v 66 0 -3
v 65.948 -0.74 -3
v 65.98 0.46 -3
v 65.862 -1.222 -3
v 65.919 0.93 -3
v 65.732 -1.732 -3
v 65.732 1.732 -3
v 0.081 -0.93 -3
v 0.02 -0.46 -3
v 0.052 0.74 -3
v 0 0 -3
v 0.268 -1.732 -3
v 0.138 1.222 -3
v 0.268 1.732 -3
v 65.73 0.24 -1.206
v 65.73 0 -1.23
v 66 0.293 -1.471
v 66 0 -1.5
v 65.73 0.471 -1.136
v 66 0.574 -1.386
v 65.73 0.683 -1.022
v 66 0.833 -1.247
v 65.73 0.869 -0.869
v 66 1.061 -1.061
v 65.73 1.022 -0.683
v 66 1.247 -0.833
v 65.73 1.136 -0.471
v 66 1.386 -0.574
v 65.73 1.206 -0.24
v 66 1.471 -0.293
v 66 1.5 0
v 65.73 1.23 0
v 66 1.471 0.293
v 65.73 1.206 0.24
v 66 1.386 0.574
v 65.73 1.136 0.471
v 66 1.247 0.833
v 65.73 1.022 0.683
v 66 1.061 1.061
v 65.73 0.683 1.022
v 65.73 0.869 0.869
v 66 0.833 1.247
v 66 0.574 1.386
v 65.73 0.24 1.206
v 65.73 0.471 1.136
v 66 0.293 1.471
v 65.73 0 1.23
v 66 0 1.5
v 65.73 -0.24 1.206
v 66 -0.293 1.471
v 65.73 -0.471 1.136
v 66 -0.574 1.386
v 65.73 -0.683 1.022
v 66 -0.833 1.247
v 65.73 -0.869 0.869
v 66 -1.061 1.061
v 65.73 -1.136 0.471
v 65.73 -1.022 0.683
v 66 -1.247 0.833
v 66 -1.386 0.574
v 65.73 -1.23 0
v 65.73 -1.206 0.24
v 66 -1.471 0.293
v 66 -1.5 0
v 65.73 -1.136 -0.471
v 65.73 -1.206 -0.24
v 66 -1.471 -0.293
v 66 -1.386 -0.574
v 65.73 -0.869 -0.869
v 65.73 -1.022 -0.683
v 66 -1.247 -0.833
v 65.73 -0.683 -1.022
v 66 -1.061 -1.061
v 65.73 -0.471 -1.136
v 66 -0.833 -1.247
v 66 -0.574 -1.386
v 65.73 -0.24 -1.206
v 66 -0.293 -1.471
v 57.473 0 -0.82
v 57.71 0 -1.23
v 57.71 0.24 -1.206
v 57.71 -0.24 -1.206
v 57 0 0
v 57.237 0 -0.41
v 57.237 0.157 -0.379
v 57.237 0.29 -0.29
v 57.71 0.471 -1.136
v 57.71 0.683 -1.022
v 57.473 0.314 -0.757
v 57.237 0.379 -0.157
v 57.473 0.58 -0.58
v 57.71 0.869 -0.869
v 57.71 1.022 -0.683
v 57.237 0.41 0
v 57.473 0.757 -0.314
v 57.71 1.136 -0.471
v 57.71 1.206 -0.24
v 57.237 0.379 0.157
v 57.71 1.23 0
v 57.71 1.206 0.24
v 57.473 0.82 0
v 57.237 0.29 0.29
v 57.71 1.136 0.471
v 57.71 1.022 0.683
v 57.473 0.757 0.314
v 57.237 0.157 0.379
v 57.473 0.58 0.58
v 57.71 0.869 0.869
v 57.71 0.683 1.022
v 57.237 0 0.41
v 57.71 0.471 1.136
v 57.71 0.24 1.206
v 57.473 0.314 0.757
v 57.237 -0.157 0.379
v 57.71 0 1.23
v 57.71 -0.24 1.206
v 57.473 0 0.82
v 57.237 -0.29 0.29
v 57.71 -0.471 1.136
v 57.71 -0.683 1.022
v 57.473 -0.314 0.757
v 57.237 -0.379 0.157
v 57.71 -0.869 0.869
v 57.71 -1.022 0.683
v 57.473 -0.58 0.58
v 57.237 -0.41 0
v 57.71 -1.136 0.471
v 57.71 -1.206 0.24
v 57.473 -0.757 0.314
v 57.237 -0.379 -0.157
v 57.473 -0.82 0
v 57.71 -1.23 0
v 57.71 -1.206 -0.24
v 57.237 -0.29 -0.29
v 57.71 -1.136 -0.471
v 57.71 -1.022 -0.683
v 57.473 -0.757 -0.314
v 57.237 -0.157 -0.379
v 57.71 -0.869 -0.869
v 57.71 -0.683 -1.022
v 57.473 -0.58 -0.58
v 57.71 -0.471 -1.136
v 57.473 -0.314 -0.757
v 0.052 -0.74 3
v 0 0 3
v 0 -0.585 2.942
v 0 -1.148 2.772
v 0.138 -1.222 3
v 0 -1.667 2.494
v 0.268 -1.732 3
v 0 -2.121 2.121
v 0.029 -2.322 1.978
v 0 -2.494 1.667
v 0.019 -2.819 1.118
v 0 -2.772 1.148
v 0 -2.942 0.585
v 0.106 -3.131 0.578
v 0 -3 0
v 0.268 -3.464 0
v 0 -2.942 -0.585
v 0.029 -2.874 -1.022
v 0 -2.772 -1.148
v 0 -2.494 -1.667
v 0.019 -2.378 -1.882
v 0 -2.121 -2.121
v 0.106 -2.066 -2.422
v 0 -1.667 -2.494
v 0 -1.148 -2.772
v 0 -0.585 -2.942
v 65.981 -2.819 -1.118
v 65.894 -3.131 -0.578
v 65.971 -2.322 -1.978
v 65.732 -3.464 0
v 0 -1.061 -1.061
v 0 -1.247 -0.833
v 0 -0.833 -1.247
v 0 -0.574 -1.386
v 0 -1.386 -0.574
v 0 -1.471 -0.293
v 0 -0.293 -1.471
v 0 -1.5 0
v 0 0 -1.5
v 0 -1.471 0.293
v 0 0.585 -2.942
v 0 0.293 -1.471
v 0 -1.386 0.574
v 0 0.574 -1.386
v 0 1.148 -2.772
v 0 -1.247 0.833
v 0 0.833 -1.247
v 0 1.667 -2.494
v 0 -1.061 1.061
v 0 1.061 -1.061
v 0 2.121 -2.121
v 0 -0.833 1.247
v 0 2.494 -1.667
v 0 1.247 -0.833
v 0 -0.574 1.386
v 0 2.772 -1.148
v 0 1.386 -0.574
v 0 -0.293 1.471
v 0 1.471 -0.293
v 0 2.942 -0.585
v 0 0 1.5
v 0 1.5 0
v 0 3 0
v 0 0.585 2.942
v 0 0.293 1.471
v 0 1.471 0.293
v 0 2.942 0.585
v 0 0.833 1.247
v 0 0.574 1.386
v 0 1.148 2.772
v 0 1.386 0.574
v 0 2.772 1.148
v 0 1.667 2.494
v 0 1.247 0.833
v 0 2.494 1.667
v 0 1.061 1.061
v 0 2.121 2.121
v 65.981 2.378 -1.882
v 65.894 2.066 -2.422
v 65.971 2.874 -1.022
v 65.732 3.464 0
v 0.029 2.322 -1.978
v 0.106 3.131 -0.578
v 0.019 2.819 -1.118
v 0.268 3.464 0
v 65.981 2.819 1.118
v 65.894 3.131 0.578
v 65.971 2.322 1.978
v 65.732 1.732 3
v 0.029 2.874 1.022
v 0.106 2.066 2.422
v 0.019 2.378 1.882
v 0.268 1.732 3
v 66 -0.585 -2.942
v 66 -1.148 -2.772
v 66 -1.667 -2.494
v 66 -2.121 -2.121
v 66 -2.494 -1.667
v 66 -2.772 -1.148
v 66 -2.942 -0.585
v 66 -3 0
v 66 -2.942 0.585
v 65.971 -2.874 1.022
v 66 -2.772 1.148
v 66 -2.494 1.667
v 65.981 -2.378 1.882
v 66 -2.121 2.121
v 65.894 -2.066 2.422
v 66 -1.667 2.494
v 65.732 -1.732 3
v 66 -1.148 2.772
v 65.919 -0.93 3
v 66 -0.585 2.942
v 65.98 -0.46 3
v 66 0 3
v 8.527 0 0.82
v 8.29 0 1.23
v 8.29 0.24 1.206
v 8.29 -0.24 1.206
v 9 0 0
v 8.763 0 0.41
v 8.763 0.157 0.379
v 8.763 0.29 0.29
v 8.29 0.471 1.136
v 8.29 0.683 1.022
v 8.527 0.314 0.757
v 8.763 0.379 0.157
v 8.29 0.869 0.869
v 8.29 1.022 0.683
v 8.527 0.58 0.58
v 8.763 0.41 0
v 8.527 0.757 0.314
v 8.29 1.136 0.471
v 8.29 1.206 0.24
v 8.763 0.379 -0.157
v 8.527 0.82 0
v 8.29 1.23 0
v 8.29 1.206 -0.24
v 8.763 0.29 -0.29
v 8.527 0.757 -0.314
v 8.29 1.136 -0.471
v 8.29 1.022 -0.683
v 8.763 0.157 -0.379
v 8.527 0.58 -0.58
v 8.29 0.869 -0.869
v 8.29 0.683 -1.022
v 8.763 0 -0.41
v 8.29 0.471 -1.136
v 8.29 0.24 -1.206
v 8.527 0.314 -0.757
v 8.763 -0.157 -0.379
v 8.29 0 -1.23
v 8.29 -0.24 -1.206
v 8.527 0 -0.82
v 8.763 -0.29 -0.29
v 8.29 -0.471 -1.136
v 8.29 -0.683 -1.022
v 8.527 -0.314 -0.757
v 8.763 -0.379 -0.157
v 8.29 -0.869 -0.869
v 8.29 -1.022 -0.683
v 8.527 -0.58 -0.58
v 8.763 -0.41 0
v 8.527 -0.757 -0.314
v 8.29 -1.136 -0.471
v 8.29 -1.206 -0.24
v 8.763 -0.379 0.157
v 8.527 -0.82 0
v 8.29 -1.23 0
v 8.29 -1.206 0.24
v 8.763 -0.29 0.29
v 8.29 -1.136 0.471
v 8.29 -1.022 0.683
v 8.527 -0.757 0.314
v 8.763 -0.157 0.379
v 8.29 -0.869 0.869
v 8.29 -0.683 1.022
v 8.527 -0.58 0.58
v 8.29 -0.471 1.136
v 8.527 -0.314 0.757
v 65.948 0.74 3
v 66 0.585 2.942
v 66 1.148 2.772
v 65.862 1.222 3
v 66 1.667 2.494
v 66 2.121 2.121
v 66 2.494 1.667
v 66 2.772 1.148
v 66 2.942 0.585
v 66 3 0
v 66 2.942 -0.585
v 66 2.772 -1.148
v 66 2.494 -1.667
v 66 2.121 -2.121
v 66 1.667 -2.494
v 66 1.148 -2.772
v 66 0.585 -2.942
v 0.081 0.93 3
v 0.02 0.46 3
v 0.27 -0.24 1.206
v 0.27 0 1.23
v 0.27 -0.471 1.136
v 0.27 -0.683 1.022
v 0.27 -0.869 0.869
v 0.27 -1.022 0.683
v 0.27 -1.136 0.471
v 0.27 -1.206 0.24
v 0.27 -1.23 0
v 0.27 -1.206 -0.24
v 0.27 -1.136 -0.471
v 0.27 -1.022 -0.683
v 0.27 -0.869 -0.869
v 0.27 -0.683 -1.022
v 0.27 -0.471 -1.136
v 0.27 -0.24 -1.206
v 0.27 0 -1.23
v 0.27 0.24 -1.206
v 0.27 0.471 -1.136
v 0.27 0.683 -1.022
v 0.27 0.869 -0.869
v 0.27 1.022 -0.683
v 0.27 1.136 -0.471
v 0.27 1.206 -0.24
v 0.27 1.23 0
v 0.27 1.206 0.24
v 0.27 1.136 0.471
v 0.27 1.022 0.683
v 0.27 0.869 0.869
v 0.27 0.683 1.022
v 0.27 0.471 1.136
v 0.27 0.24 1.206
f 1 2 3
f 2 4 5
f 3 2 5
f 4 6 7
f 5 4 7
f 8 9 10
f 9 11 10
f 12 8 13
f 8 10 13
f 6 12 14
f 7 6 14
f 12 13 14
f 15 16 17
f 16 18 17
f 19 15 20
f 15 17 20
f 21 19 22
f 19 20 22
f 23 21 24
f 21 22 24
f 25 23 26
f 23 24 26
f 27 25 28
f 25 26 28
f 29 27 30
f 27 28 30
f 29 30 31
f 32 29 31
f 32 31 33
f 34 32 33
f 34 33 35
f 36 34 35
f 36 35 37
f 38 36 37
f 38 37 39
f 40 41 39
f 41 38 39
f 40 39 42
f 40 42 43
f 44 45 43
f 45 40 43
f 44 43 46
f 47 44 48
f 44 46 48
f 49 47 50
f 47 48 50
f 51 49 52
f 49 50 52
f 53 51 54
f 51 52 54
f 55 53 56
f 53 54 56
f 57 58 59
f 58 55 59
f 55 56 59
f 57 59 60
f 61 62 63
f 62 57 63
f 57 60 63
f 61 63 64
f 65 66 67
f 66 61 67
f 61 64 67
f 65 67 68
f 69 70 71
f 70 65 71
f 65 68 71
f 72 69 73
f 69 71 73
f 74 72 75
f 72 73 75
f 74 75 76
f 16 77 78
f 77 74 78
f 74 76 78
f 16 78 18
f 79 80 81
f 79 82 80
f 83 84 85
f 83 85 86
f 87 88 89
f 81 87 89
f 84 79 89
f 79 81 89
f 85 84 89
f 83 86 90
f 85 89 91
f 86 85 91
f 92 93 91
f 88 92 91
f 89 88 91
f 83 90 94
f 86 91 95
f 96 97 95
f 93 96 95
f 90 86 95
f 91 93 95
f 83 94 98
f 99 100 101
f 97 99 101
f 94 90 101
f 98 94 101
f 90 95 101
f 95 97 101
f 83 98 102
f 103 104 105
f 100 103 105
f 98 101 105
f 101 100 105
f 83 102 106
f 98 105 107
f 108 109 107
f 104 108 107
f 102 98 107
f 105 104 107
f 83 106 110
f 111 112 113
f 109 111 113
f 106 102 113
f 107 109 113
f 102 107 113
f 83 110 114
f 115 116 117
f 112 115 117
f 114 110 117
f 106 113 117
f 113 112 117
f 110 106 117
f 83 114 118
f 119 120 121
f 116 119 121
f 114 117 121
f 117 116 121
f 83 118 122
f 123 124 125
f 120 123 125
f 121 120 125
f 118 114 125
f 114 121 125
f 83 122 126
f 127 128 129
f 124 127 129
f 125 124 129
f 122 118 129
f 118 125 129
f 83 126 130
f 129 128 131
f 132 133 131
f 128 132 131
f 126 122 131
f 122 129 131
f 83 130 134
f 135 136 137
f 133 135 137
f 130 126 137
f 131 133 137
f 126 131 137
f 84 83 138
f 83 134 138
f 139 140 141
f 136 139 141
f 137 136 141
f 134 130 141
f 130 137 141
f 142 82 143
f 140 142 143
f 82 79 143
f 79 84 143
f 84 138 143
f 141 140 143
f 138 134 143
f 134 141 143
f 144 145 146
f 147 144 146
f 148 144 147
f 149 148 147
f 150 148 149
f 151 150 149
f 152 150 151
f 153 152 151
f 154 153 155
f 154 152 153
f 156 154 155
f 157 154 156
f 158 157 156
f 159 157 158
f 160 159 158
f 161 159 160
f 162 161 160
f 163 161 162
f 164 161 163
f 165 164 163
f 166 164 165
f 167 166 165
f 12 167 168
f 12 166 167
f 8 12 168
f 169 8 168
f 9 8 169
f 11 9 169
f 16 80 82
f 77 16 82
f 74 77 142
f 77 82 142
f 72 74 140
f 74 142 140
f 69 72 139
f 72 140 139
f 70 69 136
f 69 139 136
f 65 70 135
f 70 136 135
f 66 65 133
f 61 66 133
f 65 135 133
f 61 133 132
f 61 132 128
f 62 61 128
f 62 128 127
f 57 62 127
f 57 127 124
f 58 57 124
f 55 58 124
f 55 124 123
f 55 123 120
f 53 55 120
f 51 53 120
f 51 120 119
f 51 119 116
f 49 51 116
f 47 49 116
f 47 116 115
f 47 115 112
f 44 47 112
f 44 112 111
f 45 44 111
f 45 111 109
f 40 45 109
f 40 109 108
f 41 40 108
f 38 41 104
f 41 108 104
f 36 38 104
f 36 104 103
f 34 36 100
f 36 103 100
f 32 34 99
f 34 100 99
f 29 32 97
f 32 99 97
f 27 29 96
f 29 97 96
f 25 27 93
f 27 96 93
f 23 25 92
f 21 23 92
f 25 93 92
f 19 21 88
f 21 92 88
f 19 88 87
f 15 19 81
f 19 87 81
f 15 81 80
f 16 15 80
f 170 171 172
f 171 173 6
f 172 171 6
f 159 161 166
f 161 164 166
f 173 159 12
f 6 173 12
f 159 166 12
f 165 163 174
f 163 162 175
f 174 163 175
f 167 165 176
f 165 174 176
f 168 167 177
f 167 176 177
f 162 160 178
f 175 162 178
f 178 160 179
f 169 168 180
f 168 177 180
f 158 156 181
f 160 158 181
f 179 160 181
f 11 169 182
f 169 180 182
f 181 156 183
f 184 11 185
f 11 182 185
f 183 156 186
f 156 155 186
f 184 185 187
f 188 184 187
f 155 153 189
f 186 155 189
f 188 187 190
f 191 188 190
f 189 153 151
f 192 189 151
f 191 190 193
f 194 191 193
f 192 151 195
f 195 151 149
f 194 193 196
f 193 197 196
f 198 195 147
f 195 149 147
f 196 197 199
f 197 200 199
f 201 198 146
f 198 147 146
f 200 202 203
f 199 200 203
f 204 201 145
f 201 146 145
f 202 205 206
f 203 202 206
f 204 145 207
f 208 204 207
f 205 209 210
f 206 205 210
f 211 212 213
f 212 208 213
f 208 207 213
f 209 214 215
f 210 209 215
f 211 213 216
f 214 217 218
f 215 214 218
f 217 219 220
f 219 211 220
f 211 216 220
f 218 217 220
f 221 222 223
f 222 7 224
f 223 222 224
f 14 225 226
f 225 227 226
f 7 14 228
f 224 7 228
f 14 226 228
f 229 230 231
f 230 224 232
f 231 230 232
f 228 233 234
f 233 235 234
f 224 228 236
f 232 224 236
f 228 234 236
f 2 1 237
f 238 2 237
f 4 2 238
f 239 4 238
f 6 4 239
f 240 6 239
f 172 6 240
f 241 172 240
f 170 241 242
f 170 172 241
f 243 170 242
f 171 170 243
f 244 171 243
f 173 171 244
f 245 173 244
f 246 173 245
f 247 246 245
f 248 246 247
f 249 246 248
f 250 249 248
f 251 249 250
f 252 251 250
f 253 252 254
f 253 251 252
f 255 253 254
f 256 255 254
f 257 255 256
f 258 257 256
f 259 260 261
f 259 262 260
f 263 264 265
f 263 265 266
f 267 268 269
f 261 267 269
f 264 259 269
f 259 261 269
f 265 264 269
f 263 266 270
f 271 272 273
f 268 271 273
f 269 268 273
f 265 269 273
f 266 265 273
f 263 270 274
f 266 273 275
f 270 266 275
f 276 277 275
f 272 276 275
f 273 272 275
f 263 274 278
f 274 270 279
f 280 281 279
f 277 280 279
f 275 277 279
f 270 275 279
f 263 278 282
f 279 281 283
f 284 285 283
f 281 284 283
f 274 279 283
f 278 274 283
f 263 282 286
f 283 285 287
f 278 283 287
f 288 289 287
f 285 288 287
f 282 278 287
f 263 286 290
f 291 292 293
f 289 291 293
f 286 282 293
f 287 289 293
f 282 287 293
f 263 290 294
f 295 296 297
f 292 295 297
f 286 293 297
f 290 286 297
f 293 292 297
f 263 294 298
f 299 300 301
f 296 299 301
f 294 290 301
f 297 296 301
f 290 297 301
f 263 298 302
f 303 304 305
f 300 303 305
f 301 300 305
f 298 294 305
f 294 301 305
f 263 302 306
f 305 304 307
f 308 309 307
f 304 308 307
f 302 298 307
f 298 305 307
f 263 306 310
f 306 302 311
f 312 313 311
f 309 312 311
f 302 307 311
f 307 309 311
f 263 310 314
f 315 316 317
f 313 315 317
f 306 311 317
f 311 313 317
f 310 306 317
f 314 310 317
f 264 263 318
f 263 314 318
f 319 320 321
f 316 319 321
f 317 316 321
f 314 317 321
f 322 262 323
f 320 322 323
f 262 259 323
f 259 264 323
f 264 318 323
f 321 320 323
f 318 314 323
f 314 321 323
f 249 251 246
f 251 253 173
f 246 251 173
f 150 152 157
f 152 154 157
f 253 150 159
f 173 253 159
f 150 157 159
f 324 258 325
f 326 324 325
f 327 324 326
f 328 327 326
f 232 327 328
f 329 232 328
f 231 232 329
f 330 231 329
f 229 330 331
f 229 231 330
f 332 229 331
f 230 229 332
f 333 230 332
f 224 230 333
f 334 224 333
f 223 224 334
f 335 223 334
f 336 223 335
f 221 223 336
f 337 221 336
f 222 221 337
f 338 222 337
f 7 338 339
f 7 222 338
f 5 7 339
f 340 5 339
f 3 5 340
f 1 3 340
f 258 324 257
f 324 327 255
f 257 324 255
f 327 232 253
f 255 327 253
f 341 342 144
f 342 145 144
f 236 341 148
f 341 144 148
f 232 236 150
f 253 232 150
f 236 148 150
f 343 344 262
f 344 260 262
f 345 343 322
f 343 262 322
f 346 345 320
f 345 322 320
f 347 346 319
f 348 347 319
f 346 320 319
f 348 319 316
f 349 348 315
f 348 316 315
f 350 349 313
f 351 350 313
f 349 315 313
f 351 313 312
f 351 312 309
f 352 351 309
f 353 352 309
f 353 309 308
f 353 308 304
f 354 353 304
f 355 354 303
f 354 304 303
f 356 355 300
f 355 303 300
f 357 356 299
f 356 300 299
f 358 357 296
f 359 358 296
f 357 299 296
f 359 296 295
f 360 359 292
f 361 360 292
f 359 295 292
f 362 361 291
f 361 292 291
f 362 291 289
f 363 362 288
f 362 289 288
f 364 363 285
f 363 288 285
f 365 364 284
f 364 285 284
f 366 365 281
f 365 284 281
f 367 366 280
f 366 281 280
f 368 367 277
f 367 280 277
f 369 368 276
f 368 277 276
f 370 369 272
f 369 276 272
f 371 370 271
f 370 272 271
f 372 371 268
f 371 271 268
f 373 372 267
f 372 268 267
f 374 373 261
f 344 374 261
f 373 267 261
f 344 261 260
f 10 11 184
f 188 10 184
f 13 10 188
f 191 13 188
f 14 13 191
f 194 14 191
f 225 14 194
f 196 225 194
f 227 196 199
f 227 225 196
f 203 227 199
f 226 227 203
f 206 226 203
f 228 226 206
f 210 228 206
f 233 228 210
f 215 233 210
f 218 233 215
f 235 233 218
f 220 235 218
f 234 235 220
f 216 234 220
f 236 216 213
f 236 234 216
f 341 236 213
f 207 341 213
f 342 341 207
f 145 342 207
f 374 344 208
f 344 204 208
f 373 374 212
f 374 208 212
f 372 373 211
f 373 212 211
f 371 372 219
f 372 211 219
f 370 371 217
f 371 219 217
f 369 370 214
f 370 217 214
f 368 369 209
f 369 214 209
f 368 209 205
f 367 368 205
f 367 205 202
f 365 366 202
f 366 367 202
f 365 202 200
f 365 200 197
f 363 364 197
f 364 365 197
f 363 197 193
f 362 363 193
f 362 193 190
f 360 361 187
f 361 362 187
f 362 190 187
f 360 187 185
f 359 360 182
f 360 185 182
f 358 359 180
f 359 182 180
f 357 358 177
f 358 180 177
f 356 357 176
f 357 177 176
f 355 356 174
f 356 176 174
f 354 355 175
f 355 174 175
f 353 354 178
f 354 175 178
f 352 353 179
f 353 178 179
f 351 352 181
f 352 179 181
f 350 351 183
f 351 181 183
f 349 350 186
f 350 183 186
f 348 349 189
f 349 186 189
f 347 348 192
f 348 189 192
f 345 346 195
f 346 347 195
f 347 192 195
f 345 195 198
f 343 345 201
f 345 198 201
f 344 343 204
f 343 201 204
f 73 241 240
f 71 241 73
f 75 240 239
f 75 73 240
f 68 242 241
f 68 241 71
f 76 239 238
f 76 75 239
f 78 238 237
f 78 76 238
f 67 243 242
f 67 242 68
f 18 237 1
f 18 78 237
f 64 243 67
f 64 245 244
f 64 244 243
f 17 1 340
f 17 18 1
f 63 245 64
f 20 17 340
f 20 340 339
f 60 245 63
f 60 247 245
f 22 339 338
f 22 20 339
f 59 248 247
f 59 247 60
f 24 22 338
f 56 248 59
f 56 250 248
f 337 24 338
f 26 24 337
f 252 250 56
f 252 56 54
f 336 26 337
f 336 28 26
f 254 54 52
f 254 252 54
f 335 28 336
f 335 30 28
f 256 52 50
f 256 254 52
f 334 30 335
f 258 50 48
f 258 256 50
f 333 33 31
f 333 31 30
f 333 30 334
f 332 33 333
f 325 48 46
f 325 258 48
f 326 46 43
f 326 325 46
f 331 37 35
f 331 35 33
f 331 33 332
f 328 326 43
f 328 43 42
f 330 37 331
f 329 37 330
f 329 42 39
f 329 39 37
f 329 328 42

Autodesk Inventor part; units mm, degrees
sketch "Sketch_1" plane through (0, 0, 0) normal (0, 0, 1) x (1, 0, 0)
  line L0 (66, 0) -> (0, 0)
  line L1 (0, 0) -> (0, 3)
  line L2 (0, 3) -> (2.2517, 6.9)
  line L3 (2.2517, 6.9) -> (63.7483, 6.9)
  line L4 (63.7483, 6.9) -> (66, 3)
  line L5 (66, 3) -> (66, 0)
  line L6 (66, 0) -> (0, 0)
revolve "Revolution1" add sketch "Sketch_1" angle 360 about axis through (66, 0, 0) along (1, 0, 0)
sketch "Sketch_2" plane through (0, 0, 0) normal (1, 0, 0) x (0, 1, 0)
  line L0 (6.9, 6.9) -> (-6.9, 6.9)
  line L1 (-6.9, 6.9) -> (-6.9, -6.9)
  line L2 (-6.9, -6.9) -> (6.9, -6.9)
  line L3 (6.9, -6.9) -> (6.9, 6.9)
  line L4 (1.7321, 3) -> (-1.7321, 3)
  line L5 (-1.7321, 3) -> (-3.4641, 0)
  line L6 (-3.4641, 0) -> (-1.7321, -3)
  line L7 (-1.7321, -3) -> (1.7321, -3)
  line L8 (1.7321, -3) -> (3.4641, 0)
  line L9 (3.4641, 0) -> (1.7321, 3)
extrude "Extrusion1" cut sketch "Sketch_2" along normal blind 66
sketch "Sketch3" plane through (0, 0, 0) normal (-1, 0, 0) x (0, 0, 1)
  point P0 (0, 0)
hole "Hole1" at (0, 0, 0) direction (1, 0, 0) diameter 2.459 depth 8.2901 tip angle 120 countersink diameter 3 countersink angle 90 thread size "M3x0.5" class "6H" standard "ISO Metric profile"
sketch "Sketch4" plane through (66, 0, 0) normal (1, 0, 0) x (0, 0, -1)
  point P0 (0, 0)
hole "Hole2" at (66, 0, 0) direction (-1, 0, 0) diameter 2.459 depth 8.2901 tip angle 120 countersink diameter 3 countersink angle 90 thread size "M3x0.5" class "6H" standard "ISO Metric profile"
ref_plane "C2_XY" through (0, 0, 0) normal (1, 0, 0) x (0, 0, -1)
ref_plane "C2_YZ" through (0, 0, 0) normal (0, 0, -1) x (0, 1, 0)
ref_plane "C2_ZX" through (0, 0, 0) normal (0, 1, 0) x (1, 0, 0)
properties part number "ALSFB6-66" material "アルミニウム 2014-T4"
